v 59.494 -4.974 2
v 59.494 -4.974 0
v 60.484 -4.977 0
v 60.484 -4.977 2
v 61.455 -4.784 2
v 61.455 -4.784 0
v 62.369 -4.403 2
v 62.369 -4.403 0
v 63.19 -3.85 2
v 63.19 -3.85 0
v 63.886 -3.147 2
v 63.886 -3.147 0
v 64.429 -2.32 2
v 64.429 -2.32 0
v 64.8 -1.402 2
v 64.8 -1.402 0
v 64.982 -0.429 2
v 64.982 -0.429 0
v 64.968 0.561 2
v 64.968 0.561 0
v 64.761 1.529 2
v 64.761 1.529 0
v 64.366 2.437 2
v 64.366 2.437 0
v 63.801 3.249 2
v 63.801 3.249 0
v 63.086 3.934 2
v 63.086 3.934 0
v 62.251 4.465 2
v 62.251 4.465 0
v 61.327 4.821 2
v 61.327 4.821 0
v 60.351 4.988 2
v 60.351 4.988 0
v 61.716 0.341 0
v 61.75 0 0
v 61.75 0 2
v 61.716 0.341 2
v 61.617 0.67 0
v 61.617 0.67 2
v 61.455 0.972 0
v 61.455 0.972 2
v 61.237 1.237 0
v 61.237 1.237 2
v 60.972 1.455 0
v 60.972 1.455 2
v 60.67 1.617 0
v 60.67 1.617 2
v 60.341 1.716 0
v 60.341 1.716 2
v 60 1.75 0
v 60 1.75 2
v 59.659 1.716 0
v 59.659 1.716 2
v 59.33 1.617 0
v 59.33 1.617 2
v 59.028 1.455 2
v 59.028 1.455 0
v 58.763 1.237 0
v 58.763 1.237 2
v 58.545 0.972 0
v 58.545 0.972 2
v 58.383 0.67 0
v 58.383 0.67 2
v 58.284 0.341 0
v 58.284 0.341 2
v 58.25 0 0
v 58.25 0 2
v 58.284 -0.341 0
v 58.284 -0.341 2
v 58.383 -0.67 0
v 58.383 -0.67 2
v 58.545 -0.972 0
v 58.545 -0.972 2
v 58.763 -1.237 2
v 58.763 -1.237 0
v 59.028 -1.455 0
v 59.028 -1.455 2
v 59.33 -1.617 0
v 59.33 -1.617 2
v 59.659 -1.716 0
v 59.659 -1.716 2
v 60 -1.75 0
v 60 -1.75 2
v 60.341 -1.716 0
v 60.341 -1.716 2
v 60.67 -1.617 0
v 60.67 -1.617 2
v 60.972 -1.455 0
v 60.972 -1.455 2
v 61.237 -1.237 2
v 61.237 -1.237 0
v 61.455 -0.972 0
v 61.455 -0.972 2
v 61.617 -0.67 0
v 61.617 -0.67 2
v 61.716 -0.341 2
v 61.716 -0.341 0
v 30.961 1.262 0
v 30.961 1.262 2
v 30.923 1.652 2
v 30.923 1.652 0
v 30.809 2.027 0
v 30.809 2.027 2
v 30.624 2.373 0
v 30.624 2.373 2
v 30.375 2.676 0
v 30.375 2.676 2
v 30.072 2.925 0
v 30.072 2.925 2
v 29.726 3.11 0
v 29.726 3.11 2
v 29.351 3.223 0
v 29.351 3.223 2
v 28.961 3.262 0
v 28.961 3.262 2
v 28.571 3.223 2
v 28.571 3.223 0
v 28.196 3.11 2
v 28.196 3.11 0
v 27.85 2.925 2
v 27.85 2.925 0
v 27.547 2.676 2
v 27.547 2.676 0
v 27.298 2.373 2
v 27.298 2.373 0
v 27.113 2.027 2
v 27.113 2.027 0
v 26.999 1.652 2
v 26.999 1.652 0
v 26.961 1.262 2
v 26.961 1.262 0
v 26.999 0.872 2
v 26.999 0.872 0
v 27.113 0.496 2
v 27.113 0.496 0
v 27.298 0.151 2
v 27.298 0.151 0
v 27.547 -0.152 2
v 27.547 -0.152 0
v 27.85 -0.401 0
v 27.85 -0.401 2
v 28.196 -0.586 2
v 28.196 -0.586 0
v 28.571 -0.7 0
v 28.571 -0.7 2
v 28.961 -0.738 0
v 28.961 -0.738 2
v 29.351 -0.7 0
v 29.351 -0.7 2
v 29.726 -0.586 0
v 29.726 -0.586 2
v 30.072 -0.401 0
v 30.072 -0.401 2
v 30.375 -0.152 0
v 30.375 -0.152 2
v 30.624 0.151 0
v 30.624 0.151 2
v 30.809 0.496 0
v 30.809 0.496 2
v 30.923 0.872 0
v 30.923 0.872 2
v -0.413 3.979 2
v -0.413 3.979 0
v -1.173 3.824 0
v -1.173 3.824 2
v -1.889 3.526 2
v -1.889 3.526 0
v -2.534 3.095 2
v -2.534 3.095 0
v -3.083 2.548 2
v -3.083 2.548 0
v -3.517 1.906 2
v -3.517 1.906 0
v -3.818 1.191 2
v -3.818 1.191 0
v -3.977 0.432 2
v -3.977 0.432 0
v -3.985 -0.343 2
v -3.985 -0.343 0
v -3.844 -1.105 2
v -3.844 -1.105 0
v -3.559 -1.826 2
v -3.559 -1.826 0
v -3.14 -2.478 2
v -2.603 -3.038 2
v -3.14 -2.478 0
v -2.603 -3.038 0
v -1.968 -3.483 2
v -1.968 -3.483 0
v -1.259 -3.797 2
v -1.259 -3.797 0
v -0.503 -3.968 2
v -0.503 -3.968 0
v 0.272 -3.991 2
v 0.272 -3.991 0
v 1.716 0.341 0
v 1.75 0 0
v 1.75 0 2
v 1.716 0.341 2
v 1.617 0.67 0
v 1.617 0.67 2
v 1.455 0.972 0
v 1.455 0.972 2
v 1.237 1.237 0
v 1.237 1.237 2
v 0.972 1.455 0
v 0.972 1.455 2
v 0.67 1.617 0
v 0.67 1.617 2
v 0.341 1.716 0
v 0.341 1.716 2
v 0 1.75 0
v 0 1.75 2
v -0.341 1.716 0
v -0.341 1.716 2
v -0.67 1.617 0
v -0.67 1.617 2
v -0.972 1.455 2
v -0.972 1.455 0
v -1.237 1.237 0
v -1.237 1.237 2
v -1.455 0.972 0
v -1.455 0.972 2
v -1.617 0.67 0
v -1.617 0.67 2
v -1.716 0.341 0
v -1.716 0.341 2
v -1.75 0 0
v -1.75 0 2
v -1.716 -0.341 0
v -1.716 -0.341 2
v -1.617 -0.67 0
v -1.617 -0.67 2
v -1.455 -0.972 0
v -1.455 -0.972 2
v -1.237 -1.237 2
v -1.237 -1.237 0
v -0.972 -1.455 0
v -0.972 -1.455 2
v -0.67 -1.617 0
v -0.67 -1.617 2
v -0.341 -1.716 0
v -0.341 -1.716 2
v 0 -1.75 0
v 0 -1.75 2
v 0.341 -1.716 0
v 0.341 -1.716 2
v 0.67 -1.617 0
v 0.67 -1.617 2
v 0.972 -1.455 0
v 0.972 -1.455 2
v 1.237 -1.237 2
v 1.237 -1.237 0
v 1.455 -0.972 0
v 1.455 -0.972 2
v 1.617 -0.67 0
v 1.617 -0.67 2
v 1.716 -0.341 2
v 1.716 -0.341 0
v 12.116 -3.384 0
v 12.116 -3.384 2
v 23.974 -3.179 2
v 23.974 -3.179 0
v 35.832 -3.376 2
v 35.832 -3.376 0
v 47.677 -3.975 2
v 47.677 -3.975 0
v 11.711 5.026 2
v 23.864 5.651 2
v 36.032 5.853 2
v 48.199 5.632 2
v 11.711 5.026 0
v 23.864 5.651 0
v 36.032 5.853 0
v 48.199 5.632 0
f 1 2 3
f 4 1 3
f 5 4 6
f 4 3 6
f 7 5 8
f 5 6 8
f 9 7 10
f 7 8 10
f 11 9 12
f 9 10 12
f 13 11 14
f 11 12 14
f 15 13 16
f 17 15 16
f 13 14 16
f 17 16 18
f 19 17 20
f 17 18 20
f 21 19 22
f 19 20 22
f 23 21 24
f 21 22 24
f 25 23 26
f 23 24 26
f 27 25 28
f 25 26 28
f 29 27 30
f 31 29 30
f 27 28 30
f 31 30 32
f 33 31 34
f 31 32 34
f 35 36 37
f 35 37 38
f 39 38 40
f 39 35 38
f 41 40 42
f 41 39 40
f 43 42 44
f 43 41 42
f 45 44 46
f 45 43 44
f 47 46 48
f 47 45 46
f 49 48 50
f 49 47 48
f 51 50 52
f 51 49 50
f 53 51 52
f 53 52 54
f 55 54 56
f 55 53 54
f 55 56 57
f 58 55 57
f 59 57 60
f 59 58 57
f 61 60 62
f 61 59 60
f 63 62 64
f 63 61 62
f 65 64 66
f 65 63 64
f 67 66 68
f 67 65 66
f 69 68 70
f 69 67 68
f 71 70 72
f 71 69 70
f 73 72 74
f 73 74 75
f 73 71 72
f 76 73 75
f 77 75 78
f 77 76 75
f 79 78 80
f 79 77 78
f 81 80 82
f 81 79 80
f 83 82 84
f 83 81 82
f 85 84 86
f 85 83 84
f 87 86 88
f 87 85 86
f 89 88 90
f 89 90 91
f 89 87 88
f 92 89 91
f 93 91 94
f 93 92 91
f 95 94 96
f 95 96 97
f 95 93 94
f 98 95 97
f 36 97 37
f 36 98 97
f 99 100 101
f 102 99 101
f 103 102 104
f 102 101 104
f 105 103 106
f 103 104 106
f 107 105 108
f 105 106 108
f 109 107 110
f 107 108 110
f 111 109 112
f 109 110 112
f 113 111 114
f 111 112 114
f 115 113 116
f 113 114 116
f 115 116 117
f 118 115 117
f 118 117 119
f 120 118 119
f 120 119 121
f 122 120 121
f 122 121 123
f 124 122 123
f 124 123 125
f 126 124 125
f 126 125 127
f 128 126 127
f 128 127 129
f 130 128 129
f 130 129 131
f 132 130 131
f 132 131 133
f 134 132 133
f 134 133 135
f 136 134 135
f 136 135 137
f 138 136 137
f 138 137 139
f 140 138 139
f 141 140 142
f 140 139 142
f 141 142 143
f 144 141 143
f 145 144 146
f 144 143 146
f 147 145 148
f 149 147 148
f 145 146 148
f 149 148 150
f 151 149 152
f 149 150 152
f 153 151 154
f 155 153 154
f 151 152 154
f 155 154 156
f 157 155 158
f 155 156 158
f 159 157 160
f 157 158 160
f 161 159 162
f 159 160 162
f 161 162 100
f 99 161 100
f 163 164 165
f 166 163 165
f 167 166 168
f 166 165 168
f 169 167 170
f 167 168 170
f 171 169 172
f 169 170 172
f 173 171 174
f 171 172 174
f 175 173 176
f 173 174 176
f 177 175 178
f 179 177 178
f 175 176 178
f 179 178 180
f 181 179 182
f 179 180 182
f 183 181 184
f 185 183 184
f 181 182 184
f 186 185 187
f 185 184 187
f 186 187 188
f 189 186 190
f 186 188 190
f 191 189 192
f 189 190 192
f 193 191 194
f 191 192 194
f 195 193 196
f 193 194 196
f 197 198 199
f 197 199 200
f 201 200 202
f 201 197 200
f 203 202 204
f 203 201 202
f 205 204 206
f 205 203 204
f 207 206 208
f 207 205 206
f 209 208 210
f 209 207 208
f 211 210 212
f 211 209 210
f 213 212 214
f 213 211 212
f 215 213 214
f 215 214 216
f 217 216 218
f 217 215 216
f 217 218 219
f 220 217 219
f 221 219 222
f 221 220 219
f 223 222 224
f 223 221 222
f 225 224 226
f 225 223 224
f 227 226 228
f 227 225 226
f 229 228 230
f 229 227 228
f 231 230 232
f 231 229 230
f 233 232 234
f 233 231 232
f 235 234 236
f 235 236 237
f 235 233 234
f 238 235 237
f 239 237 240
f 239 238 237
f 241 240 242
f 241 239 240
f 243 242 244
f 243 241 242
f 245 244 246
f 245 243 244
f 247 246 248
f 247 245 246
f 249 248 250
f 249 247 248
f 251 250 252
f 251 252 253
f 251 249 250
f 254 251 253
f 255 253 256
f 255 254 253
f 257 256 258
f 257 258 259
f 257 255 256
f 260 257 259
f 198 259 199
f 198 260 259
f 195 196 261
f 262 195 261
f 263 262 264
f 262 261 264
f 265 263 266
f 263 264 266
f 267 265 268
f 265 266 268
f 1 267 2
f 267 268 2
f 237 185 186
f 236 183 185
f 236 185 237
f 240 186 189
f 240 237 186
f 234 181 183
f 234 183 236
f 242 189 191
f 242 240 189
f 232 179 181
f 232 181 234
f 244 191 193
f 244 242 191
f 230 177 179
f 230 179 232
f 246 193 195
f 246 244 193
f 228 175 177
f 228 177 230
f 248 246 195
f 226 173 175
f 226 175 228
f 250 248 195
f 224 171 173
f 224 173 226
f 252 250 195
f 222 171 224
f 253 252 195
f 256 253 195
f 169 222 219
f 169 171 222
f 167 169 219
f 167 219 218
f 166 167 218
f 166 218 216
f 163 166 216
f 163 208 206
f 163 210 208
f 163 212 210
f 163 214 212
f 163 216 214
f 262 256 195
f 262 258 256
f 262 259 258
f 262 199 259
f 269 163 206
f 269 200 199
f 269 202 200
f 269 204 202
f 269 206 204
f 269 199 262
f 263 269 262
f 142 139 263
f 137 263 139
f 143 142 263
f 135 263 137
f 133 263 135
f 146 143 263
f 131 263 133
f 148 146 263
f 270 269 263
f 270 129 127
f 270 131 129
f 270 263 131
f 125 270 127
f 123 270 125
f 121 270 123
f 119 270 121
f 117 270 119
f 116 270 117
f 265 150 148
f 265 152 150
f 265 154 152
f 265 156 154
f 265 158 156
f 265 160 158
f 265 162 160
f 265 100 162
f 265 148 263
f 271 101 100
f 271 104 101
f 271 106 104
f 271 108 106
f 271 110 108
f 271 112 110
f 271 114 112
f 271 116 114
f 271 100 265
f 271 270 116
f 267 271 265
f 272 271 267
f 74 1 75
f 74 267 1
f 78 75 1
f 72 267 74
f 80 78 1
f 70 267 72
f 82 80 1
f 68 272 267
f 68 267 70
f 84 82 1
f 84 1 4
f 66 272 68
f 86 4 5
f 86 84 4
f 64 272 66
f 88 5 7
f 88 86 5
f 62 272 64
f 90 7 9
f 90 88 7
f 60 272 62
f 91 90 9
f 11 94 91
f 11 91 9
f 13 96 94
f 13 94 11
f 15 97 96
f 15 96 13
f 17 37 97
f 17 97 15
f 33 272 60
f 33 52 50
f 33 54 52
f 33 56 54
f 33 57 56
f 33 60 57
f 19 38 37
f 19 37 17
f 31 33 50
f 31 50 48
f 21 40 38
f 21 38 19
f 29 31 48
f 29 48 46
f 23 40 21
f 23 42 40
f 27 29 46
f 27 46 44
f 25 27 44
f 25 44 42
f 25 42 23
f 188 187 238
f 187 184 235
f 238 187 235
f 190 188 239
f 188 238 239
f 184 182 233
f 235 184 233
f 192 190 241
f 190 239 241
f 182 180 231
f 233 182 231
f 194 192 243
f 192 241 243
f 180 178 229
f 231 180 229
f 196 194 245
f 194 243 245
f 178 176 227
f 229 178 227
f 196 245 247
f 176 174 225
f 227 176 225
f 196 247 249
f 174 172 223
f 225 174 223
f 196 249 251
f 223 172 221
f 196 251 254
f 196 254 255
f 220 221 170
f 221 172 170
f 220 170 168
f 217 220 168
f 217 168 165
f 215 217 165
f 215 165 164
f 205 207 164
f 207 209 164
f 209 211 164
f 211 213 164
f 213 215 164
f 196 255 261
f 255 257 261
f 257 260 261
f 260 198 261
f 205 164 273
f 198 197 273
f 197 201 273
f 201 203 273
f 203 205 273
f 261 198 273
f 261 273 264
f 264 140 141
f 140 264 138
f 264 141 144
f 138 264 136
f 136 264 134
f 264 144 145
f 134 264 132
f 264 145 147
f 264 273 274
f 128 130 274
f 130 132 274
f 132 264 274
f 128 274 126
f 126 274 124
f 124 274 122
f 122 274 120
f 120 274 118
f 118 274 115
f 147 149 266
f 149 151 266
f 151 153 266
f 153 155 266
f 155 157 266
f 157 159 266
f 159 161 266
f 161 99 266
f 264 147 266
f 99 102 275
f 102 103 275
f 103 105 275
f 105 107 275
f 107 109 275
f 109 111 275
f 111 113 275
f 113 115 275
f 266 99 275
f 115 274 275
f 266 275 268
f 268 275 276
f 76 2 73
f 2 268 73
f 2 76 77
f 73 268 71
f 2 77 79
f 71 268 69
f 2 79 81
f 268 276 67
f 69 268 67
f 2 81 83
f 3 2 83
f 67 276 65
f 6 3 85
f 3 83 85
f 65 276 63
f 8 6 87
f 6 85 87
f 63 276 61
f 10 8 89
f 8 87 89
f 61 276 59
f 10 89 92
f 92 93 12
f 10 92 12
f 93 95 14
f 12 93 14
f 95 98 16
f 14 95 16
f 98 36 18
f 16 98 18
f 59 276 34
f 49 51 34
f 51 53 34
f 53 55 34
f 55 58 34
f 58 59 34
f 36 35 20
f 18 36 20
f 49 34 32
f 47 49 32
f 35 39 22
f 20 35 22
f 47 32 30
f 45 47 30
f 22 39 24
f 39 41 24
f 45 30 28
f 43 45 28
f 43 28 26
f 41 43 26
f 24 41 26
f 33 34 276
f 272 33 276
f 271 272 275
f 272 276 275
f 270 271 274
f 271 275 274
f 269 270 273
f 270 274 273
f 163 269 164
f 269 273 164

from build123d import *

# Parameters (mm, degrees)
SKETCH1_R           = 1.75
BOSS_EXTRUDE1_DEPTH = 2
SKETCH_1_R          = 2
CUT_EXTRUDE_1_DEPTH = 10


with BuildPart() as part:
    # Sketch1 → Boss-Extrude1 (new body)
    with BuildSketch(Plane.XY):
        with BuildLine():
            ThreePointArc((-0.413391137, 3.978581125), (-3.985278749, -0.34286046), (0.272222222, -3.990726132))
            ThreePointArc((0.272222222, -3.990726132), (29.90408025, -3.227529096), (59.494248826, -4.974355813))
            ThreePointArc((59.494248826, -4.974355813), (64.981597081, -0.428591321), (60.351328502, 4.987641555))
            ThreePointArc((60.351328502, 4.987641555), (29.947025925, 5.804484659), (-0.413391137, 3.978581125))
        make_face()
        Circle(SKETCH1_R, mode=Mode.SUBTRACT)
        with Locations((60, 0)):
            Circle(SKETCH1_R, mode=Mode.SUBTRACT)
    extrude(amount=BOSS_EXTRUDE1_DEPTH)

    # 草图1 → 切除-拉伸1 (cut)
    with BuildSketch(Plane.XY.offset(2)):
        with Locations((28.961050448, 1.261749932)):
            Circle(SKETCH_1_R)
    extrude(amount=-CUT_EXTRUDE_1_DEPTH, mode=Mode.SUBTRACT)


solid = part.part
